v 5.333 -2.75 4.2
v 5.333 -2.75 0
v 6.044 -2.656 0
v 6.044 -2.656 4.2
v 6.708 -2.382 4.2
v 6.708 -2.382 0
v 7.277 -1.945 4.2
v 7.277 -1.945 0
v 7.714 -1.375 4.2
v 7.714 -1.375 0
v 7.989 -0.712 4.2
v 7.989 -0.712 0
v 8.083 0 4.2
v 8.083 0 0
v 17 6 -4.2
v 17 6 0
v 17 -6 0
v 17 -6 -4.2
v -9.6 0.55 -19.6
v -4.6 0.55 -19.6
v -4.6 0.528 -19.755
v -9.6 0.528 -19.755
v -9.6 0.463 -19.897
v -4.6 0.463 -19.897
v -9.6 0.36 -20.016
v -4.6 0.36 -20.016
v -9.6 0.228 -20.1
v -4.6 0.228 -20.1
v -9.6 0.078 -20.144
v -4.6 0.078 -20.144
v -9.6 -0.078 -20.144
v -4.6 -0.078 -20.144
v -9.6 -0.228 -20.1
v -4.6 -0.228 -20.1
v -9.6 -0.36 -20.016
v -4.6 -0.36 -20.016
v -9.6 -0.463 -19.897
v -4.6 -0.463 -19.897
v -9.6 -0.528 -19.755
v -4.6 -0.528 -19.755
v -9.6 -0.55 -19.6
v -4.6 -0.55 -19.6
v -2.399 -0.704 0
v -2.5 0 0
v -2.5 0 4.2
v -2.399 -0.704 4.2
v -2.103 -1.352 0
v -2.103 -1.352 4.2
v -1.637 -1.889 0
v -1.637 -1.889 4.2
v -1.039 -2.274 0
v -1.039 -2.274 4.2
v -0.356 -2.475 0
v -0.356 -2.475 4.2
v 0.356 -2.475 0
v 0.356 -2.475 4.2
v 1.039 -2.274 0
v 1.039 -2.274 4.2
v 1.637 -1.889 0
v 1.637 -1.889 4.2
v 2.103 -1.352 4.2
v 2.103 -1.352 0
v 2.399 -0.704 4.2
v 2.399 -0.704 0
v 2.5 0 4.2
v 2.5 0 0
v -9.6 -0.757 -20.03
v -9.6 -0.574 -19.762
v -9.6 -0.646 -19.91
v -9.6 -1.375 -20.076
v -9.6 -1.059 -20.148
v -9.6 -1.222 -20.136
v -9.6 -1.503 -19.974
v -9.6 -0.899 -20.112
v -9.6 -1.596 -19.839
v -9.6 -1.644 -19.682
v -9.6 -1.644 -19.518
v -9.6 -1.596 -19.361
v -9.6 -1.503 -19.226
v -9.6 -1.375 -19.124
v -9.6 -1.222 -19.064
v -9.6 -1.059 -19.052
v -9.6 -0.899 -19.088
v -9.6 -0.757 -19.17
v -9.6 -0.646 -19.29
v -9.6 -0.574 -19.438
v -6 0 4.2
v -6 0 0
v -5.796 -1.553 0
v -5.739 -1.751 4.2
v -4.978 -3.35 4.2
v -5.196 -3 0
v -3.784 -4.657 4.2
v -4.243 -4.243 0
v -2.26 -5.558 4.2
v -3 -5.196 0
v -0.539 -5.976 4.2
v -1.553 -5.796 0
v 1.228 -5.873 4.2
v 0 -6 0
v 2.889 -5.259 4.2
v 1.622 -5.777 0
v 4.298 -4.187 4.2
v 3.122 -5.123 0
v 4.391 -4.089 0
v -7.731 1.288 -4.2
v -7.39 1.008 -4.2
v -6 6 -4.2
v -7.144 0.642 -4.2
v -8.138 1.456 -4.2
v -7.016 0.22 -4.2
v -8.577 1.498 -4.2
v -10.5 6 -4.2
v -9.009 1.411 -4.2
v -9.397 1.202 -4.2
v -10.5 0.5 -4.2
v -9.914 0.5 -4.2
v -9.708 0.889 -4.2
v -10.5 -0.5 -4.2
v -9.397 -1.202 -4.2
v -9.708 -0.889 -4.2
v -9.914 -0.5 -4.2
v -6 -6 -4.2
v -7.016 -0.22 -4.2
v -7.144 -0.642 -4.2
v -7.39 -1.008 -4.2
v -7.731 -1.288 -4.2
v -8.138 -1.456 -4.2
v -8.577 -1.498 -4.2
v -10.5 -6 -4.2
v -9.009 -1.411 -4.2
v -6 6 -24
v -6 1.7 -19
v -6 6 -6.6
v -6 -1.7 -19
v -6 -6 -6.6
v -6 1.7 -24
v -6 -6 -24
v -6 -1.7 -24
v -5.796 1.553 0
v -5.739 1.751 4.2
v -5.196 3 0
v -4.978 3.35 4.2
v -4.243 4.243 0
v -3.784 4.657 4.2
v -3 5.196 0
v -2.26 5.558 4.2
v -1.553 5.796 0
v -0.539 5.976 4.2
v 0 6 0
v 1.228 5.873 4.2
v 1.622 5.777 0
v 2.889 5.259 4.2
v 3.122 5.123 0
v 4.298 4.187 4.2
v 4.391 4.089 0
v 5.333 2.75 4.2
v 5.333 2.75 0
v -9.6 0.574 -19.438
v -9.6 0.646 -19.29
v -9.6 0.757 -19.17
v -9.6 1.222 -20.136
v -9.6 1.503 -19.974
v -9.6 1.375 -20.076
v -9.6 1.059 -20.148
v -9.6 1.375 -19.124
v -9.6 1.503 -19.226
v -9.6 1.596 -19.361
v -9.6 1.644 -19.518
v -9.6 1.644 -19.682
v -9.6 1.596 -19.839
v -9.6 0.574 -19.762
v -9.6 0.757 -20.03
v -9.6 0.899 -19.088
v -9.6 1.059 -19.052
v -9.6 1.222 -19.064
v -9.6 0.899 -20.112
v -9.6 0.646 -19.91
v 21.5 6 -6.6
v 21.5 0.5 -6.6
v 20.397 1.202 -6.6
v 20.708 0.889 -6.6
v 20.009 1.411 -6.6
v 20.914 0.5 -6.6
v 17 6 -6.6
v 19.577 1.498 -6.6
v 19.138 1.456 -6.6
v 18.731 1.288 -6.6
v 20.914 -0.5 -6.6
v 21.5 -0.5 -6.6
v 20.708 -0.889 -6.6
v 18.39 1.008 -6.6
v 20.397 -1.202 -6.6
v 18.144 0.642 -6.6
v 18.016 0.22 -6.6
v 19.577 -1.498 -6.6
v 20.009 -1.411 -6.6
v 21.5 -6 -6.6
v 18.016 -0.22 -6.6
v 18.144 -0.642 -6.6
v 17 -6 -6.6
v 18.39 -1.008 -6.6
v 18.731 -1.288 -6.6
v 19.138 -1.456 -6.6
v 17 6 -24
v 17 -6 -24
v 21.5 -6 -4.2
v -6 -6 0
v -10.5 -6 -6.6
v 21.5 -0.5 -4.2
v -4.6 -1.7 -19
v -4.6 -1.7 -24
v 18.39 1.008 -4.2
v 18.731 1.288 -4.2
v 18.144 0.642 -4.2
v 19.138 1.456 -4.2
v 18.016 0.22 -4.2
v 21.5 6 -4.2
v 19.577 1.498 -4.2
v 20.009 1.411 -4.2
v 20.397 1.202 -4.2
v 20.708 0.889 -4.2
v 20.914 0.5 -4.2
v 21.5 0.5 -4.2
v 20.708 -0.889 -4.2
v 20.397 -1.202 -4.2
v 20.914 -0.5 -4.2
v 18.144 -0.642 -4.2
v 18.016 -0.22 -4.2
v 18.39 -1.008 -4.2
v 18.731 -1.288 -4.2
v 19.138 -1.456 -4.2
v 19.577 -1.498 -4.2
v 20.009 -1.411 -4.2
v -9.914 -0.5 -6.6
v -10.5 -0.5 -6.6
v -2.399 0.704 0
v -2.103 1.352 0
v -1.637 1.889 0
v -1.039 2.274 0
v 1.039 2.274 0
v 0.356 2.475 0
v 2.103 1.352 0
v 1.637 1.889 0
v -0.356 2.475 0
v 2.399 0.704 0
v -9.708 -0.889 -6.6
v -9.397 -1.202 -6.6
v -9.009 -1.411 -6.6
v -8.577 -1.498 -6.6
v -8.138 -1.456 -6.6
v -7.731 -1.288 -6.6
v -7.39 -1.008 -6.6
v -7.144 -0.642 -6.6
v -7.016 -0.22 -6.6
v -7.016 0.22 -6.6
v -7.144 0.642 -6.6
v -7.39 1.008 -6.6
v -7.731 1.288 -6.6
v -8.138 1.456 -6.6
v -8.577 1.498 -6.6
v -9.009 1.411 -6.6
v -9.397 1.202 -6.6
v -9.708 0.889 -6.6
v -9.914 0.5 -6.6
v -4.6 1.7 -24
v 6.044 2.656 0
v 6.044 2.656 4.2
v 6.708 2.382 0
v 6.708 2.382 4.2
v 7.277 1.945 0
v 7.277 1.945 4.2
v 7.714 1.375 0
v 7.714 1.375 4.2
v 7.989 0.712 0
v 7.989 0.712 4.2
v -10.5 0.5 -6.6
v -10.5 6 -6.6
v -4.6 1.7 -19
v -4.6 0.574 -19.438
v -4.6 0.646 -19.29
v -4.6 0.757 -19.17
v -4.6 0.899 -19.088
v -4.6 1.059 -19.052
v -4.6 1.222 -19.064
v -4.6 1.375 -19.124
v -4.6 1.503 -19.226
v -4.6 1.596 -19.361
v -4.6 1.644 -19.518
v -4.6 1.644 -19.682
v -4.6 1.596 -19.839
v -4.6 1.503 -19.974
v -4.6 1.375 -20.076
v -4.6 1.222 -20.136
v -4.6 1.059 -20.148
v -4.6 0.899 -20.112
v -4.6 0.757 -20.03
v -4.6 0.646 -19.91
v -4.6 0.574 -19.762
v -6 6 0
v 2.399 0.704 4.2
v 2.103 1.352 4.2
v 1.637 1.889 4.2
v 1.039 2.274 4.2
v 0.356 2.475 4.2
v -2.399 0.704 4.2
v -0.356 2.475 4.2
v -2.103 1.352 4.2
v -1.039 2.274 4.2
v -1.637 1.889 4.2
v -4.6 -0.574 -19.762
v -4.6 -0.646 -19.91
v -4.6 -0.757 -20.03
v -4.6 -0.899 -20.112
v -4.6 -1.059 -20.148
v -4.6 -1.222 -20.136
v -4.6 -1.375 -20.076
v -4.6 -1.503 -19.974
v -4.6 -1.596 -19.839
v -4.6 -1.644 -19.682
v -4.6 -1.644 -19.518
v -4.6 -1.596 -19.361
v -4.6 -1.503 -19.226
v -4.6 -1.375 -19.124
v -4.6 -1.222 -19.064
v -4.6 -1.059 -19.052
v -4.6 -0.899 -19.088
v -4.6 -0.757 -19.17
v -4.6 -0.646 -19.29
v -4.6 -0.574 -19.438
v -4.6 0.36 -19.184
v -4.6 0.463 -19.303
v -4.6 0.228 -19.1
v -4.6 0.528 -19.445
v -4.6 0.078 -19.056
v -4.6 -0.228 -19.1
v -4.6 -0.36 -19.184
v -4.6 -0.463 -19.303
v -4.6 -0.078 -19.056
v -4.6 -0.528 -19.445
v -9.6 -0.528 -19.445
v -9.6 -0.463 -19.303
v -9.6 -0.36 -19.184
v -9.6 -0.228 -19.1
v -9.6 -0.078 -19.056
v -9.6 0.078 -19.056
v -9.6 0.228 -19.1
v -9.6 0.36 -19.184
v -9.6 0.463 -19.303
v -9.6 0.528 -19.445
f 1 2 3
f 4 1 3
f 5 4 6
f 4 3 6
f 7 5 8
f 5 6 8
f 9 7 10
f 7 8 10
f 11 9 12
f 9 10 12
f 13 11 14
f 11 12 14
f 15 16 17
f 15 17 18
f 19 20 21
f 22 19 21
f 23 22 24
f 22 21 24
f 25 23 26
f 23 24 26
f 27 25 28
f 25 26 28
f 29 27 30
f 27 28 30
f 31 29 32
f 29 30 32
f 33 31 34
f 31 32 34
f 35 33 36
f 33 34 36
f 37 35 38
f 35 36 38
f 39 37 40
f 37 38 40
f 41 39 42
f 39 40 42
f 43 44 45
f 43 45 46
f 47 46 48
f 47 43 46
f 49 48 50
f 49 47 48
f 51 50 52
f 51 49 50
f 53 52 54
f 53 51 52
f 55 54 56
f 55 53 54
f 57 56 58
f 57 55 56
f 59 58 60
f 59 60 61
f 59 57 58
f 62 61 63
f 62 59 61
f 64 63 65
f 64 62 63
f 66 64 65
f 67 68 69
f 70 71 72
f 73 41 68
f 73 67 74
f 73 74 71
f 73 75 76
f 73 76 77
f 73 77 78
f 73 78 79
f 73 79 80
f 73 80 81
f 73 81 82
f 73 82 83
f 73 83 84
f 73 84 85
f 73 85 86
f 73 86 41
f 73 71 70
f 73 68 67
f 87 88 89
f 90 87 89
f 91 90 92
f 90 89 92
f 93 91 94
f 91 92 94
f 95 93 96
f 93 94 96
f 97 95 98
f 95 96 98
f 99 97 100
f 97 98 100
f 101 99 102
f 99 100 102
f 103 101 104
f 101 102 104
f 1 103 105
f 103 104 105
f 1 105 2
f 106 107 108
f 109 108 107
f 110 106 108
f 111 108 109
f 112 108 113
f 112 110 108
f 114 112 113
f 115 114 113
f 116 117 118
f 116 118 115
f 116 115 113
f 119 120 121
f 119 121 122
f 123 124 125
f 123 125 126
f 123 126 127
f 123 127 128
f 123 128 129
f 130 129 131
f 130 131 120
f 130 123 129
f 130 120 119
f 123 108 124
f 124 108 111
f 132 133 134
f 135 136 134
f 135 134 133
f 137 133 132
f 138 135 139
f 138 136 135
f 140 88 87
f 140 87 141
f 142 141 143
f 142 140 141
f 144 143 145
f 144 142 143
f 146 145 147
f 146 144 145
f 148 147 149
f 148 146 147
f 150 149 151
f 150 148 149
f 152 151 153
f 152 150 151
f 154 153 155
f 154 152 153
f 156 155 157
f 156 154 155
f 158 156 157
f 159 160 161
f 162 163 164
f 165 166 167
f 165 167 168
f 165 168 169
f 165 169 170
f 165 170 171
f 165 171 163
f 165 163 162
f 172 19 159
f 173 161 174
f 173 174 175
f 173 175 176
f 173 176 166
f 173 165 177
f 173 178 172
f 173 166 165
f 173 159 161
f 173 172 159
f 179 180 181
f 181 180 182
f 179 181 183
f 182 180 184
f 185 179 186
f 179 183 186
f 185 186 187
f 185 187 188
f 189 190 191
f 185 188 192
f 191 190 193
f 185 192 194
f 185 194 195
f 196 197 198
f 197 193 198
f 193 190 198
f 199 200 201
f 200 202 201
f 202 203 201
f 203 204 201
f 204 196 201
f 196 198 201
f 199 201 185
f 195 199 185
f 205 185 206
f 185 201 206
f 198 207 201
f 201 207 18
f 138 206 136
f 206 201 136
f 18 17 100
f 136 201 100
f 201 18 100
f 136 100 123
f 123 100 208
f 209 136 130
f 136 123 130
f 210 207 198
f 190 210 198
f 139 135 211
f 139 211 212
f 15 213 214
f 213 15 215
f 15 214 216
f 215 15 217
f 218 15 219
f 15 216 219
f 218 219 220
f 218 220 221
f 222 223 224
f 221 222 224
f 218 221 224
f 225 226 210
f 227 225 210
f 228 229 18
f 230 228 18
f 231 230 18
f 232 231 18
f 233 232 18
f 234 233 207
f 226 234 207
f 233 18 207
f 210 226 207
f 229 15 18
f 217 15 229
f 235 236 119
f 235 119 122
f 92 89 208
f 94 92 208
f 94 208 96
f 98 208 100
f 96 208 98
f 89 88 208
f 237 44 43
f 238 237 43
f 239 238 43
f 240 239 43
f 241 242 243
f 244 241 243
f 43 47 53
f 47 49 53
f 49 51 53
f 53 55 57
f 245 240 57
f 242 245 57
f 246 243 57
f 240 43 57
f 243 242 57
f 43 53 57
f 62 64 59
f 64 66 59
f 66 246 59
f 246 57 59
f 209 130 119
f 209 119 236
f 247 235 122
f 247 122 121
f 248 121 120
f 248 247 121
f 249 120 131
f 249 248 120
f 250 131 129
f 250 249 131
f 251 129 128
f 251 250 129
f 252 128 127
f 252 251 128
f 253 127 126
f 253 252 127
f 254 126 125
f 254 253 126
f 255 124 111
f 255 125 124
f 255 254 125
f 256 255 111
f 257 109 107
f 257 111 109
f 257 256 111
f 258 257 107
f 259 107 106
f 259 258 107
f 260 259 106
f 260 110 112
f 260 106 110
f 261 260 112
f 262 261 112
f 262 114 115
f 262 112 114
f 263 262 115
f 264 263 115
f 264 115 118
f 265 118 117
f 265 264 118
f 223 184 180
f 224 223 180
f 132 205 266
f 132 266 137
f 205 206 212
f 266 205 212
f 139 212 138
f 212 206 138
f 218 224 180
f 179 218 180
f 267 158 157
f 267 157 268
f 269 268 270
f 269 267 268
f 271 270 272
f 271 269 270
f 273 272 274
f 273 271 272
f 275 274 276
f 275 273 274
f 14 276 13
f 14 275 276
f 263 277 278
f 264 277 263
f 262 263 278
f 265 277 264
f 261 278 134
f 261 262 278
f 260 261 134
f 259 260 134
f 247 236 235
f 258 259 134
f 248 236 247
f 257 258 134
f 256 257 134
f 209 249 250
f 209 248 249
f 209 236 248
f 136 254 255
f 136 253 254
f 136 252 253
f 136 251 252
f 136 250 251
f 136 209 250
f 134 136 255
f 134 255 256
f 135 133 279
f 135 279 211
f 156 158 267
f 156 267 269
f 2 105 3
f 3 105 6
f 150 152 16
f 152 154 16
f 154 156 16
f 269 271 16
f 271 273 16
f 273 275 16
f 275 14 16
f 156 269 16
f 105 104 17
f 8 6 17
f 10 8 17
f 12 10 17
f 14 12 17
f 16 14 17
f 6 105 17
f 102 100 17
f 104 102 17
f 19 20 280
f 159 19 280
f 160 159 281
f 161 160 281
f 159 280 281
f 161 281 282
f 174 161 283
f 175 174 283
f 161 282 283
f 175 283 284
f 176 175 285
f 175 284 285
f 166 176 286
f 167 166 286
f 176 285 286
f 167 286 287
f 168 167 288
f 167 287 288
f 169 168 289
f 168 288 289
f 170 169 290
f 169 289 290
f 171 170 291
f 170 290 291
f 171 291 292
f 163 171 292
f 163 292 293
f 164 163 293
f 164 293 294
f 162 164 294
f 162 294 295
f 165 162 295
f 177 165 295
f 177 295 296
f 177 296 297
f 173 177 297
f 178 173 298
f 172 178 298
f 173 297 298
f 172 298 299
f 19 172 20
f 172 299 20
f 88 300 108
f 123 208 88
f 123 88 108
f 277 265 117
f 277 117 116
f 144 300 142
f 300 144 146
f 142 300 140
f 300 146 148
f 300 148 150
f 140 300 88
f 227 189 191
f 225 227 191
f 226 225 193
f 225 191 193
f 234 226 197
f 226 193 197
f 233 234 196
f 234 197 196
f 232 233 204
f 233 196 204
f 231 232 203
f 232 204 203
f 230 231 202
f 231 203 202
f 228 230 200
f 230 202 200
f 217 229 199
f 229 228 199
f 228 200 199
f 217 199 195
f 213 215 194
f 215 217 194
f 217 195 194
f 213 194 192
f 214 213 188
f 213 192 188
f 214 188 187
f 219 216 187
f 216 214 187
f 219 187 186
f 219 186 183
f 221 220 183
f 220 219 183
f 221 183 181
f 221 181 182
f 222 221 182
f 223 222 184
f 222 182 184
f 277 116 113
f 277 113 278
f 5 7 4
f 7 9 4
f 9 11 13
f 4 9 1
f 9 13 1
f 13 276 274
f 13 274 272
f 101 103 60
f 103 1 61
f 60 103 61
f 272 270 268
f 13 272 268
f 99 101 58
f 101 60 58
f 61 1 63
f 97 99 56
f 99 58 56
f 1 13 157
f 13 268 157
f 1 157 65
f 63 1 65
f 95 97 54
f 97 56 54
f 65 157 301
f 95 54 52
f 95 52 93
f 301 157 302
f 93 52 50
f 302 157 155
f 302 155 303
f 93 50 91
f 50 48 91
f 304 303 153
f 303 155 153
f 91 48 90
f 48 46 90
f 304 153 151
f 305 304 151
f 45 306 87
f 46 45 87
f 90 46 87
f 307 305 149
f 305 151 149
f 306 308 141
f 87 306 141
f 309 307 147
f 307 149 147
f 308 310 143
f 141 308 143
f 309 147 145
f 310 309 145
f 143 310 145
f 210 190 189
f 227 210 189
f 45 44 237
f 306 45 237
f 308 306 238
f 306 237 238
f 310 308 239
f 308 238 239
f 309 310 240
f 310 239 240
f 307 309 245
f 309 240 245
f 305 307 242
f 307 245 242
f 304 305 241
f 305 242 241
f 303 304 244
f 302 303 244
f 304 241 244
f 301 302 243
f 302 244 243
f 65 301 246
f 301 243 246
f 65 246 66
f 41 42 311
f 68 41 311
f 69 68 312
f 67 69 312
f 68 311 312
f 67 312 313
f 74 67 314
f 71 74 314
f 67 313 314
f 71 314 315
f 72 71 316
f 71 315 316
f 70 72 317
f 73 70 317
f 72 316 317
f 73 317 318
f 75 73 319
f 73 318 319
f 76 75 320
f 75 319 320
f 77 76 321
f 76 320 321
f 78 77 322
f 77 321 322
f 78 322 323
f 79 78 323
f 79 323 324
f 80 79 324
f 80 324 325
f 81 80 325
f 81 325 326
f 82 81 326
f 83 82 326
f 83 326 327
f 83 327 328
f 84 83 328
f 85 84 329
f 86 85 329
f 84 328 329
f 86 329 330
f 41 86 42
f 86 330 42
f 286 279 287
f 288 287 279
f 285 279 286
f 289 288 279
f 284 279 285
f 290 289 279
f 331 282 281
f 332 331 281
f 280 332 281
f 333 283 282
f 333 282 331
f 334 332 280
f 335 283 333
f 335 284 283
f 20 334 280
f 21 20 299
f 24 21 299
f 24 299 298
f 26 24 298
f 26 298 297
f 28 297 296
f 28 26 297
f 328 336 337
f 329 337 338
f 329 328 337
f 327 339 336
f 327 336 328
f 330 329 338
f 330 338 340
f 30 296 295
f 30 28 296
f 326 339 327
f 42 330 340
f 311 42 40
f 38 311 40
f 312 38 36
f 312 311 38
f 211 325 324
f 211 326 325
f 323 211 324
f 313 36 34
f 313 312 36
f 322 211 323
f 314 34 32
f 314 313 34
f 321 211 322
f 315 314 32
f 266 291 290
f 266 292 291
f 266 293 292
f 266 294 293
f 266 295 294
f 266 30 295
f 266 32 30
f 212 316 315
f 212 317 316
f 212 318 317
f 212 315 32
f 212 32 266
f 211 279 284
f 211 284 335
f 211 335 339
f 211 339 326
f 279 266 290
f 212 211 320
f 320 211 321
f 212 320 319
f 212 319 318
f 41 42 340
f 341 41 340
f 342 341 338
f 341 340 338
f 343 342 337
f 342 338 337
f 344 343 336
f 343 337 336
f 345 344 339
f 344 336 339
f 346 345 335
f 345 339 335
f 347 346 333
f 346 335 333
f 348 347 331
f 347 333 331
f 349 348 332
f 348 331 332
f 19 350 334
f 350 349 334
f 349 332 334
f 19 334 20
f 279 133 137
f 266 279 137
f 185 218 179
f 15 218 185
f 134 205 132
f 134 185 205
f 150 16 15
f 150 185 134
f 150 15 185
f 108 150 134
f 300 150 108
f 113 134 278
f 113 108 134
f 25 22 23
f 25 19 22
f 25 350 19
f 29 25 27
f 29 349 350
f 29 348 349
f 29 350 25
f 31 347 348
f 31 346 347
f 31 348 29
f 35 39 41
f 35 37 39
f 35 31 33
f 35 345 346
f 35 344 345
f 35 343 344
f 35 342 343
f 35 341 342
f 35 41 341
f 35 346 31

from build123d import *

# Parameters (mm, degrees)
PAD023_DEPTH         = 6
POCKET021_DEPTH      = 62.4829974073
POCKET021_DEPTH_BACK = 86.4829974073
PAD001_DEPTH         = 4.2
SKETCH003_W          = 5
SKETCH003_H          = 3.4
POCKET022_DEPTH      = 1.4
SKETCH004_R          = 0.55
PAD002_DEPTH         = 5


with BuildPart() as part:
    # Sketch044 → Pad023 (new body, symmetric)
    with BuildSketch(Plane.XZ):
        Polygon((-11.5, 0), (0, 0), (0, 24), (-11.5, 24), (-11.5, 19.8), (-16, 19.8), (-16, 17.4), (-11.5, 17.4), align=None)
    extrude(amount=PAD023_DEPTH, both=True)

    # Sketch001 → Pocket021 (cut, two sides)
    with BuildSketch(Plane.XY) as pocket021_sk:
        with BuildLine():
            ThreePointArc((-15.4142135624, -0.5), (-12.5, 0), (-15.4142135624, 0.5))
            Line((-15.4142135624, 0.5), (-19.4142135624, 0.5))
            Line((-19.4142135624, 0.5), (-19.4142135624, -0.5))
            Line((-19.4142135624, -0.5), (-15.4142135624, -0.5))
        make_face()
    extrude(amount=-POCKET021_DEPTH, mode=Mode.SUBTRACT)
    extrude(pocket021_sk.sketch, amount=POCKET021_DEPTH_BACK, mode=Mode.SUBTRACT)

    # Mirrored007: part across Sketch001 V_Axis


with BuildPart() as part_1:
    add(part.part)
    add(part.part.mirror(Plane(origin=(0, 0, 0), x_dir=(0, 0, 1), z_dir=(1, 0, 0))))

    # Sketch002 (on Face22 of Mirrored007) → Pad001 (join)
    with BuildSketch(Plane(origin=(-5.5, 0, 24), x_dir=(-1, 0, 0), z_dir=(0, 0, 1))):
        with BuildLine():
            ThreePointArc((6, 0), (1.41490397, 5.8307844031), (-5.3326822519, 2.75))
            ThreePointArc((-5.3326822519, 2.75), (-7.2772259002, 1.9445436483), (-8.0826822519, 0))
            Line((-8.0826822519, 0), (-2.5, 0))
            ThreePointArc((2.5, 0), (0, 2.5), (-2.5, 0))
            Line((2.5, 0), (6, 0))
        make_face()
    pad001 = extrude(amount=PAD001_DEPTH)

    # Mirrored008: Pad001 across Sketch002 H_Axis
    add(pad001.mirror(Plane(origin=(-5.5, 0, 24), x_dir=(0, 0, 1), z_dir=(0, -1, 0))))

    # Sketch003 (on Face3 of Mirrored008) → Pocket022 (cut)
    with BuildSketch(Plane(origin=(-11.5, 0, 0), x_dir=(0, 0, -1), z_dir=(-1, 0, 0))):
        with Locations((-2.5, 0)):
            Rectangle(SKETCH003_W, SKETCH003_H)
    extrude(amount=-POCKET022_DEPTH, mode=Mode.SUBTRACT)

    # Sketch004 (on Face28 of Pocket022) → Pad002 (join)
    with BuildSketch(Plane(origin=(-10.1, 0, 0), x_dir=(0, 0, -1), z_dir=(-1, 0, 0))):
        with Locations((-4.4, 1.1)):
            Circle(SKETCH004_R)
        with Locations((-4.4, 0)):
            Circle(SKETCH004_R)
        with Locations((-4.4, -1.1)):
            Circle(SKETCH004_R)
    extrude(amount=PAD002_DEPTH)


with BuildPart() as part_2:
    # Body018 placement: moved
    add(part_1.part.moved(Location((5.5, 0, -24))))


solid = part_2.part
